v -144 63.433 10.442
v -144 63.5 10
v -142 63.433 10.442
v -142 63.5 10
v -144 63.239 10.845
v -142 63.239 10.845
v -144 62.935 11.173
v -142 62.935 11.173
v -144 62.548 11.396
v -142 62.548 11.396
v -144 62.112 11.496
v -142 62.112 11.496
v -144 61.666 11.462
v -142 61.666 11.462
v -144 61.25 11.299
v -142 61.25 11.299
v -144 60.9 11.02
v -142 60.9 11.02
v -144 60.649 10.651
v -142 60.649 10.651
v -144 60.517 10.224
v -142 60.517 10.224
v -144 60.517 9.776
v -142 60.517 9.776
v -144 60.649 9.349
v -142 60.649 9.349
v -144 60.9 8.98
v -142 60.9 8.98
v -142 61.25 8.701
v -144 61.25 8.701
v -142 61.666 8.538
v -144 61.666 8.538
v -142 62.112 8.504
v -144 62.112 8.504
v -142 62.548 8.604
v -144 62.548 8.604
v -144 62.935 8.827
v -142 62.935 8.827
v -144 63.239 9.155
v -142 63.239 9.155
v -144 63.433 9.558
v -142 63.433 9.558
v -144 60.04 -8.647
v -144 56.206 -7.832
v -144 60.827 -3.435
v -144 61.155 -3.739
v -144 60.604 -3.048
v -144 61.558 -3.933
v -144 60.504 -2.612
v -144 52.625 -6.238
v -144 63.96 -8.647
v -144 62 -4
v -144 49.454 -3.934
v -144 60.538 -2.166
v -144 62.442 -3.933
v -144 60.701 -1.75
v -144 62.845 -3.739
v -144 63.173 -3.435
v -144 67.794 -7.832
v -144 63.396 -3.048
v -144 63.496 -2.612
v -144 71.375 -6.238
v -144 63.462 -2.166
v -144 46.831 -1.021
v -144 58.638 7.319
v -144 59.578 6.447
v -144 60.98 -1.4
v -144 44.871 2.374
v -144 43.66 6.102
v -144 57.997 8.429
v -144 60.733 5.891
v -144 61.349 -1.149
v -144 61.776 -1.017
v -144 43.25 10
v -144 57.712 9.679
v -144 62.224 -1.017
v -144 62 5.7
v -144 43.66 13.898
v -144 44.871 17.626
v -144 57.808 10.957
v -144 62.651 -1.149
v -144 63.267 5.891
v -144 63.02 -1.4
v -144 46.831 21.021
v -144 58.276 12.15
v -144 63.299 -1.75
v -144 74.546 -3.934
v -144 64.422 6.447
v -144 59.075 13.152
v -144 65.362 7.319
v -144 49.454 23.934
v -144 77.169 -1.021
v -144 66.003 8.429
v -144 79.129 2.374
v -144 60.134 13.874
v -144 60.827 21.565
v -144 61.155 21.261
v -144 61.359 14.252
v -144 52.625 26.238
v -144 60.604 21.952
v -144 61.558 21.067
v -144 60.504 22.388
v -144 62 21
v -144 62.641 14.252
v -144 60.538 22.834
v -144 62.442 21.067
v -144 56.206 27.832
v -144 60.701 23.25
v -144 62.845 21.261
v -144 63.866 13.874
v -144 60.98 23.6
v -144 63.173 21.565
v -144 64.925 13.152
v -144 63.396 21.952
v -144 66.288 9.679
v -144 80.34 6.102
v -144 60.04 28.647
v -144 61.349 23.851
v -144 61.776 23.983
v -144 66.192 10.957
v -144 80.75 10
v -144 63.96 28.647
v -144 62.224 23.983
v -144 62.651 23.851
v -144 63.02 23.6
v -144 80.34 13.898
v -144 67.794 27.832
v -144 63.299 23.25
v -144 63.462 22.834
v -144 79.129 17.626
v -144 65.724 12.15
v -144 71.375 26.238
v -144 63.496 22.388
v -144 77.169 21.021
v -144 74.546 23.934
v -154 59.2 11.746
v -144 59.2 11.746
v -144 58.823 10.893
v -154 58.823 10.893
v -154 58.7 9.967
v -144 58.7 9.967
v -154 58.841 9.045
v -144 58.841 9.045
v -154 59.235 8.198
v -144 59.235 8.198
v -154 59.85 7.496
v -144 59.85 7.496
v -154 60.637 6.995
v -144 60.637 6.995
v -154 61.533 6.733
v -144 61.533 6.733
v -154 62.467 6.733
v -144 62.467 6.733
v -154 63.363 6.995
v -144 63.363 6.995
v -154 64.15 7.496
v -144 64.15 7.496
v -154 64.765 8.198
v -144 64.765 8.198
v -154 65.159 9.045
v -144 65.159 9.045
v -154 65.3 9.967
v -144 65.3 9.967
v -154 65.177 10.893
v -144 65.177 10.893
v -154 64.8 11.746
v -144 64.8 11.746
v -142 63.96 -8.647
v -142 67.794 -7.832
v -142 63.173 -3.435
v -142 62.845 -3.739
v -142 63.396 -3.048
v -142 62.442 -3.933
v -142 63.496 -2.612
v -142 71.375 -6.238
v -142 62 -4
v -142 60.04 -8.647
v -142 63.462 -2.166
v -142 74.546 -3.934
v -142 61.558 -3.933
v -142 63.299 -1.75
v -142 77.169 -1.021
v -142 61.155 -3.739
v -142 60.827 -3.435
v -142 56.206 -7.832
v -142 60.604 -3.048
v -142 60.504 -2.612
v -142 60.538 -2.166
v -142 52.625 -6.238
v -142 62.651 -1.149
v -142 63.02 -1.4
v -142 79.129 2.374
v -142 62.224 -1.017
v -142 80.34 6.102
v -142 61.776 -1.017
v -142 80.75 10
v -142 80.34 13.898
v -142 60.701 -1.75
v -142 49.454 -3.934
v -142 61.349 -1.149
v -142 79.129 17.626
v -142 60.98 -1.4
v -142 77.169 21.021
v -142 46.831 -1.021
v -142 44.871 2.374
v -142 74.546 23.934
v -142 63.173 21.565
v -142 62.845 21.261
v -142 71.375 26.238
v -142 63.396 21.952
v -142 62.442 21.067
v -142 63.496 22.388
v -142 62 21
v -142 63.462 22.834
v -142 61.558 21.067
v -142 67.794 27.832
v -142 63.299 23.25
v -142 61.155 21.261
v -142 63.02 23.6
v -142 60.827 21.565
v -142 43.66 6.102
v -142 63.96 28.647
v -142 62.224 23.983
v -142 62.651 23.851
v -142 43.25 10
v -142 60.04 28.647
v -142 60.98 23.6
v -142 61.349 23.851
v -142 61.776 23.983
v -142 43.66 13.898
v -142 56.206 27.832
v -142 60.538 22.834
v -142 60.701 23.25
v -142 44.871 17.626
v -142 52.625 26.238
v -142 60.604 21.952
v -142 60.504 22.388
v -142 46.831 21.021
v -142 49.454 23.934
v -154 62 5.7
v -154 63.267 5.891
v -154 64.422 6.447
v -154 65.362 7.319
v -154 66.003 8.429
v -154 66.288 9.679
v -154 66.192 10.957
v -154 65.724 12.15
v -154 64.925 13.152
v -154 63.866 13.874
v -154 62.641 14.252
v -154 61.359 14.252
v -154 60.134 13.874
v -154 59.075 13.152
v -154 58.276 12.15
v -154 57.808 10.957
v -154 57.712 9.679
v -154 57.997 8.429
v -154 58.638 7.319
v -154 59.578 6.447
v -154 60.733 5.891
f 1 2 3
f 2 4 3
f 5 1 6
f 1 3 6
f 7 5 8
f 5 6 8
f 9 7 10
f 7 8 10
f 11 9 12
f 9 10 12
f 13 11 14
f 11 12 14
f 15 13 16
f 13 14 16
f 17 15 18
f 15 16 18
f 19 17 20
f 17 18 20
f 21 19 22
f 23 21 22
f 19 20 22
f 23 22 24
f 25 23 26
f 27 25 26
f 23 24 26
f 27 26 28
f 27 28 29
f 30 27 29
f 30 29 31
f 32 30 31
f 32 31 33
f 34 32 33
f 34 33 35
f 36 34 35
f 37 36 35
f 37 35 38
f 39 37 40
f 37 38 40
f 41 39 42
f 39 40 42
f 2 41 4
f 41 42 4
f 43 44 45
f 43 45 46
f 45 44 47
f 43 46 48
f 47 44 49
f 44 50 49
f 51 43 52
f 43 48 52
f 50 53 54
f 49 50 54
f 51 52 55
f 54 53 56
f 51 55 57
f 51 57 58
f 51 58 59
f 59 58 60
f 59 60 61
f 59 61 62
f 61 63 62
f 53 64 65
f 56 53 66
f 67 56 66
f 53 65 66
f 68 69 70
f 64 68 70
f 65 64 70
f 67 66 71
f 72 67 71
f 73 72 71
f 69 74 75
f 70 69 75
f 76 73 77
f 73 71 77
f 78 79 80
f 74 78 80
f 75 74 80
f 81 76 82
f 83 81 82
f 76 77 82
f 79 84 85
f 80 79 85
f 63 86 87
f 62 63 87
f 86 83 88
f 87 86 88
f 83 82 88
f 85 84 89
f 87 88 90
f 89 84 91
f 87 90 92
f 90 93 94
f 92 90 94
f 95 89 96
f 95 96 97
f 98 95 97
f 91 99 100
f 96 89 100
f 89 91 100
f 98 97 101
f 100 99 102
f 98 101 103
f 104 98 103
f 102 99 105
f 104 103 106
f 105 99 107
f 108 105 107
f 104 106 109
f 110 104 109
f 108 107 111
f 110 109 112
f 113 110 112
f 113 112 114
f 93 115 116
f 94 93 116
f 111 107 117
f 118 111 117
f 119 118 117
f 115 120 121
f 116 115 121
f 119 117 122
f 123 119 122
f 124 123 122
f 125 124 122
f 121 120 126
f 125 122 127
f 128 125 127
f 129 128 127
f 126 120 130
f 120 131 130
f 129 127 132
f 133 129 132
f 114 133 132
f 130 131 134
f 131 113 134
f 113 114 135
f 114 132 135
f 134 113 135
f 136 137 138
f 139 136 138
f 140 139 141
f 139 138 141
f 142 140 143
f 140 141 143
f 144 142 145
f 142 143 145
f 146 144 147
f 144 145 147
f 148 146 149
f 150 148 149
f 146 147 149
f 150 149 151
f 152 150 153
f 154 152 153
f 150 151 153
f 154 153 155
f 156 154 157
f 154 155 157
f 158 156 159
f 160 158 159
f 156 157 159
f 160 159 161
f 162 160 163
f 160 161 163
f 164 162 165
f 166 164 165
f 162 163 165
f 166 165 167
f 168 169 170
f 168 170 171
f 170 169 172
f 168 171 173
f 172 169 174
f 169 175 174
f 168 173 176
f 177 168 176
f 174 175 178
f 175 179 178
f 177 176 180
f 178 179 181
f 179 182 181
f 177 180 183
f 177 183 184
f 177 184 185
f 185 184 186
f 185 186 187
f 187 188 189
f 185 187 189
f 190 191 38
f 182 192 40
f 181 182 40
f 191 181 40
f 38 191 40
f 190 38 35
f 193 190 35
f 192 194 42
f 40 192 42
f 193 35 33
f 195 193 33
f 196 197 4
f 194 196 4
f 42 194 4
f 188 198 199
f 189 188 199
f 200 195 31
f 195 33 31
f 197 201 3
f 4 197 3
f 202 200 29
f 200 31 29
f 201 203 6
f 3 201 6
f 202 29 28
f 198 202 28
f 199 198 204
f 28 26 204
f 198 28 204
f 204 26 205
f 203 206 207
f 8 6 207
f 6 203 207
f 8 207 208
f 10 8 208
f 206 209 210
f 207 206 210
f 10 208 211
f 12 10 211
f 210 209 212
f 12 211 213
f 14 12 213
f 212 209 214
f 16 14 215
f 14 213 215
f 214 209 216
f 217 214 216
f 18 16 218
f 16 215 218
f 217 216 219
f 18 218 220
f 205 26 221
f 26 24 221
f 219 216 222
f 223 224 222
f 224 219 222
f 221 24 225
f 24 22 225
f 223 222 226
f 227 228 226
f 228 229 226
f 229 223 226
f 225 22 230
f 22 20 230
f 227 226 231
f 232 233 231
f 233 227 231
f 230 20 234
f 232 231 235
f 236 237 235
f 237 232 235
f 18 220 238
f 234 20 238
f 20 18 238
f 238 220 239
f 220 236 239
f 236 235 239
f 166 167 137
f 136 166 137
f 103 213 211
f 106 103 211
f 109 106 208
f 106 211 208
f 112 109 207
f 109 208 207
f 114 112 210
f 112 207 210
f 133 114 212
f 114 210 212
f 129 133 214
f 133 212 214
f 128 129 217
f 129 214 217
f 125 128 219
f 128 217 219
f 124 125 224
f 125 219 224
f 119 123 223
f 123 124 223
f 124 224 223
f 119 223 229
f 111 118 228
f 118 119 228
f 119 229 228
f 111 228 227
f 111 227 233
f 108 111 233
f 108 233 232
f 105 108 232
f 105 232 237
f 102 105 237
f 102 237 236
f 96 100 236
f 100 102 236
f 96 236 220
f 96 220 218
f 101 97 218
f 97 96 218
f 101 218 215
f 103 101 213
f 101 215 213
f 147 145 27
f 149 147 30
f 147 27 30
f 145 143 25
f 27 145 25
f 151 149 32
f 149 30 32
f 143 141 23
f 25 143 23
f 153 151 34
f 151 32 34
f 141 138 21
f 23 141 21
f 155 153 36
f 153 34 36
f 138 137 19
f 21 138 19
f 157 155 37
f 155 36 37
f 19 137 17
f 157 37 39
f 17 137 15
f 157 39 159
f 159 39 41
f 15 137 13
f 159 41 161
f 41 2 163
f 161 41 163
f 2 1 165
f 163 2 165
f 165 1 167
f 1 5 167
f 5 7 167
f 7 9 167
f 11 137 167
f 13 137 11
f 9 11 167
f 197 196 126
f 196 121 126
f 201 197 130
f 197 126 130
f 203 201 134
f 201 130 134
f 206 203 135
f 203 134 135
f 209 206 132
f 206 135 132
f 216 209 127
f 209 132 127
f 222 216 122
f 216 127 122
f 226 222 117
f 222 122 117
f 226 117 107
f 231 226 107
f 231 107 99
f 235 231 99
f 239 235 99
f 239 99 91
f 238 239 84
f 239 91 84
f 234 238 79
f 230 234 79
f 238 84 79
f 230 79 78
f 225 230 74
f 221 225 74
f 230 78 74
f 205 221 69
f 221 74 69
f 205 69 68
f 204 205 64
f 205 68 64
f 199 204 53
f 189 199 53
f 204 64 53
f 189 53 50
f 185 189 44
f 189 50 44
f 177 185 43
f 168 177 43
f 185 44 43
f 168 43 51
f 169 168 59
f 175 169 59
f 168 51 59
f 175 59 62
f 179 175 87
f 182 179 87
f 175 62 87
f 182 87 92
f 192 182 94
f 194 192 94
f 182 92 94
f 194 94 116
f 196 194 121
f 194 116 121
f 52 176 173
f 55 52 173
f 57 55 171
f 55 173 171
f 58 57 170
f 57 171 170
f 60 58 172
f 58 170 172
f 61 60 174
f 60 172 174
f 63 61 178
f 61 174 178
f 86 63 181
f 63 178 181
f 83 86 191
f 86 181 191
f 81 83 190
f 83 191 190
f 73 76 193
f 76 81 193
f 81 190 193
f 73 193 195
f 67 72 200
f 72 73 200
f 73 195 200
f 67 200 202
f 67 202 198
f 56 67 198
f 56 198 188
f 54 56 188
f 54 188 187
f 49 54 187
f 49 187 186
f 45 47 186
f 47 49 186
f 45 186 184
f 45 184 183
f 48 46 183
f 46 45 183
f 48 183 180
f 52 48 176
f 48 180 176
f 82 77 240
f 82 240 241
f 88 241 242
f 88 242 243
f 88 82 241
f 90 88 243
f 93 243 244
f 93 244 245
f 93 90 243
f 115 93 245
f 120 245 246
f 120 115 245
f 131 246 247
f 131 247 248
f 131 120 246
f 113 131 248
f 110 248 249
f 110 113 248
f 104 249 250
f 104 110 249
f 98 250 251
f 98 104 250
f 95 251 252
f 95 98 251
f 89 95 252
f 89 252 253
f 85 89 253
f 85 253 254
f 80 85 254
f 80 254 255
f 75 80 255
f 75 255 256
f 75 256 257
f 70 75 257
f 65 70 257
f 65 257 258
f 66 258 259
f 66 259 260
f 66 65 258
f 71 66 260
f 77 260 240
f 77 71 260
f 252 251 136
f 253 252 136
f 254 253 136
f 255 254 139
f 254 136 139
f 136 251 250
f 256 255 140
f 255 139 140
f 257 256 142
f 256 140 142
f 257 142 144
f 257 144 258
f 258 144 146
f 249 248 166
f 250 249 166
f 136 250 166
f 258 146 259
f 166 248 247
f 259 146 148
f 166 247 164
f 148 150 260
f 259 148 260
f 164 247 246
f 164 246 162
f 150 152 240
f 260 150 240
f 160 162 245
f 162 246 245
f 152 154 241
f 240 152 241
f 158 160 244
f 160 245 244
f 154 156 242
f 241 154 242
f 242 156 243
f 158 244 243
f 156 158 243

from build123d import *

# Parameters (mm, degrees)
CYLINDER031_R           = 1.5
CYLINDER031_DEPTH       = 15
CYLINDER031_PITCH_ANGLE = 90
CYLINDER030_R           = 1.5
CYLINDER030_DEPTH       = 15
CYLINDER030_PITCH_ANGLE = 90
SKETCH016_R             = 4.3
EXTRUDE011_DEPTH        = 10
FUSION039_PITCH_ANGLE   = 90


with BuildPart() as m3_hole008:
    # Cylinder031 → Cylinder031 (new body)
    with BuildSketch(Plane.XY):
        Circle(CYLINDER031_R)
    extrude(amount=CYLINDER031_DEPTH)


with BuildPart() as m3_hole008_1:
    # Cylinder031 pitch: moved
    add(m3_hole008.part.rotate(Axis((0, 0, 0), (0, 1, 0)), CYLINDER031_PITCH_ANGLE))


with BuildPart() as m3_hole008_2:
    # Cylinder031 placement: moved
    add(m3_hole008_1.part.moved(Location((163.5, 47, -2.5))))


with BuildPart() as encoder_to_wheel_holes:
    # Cylinder030 → Cylinder030 (new body)
    with BuildSketch(Plane.XY):
        Circle(CYLINDER030_R)
    extrude(amount=CYLINDER030_DEPTH)


with BuildPart() as encoder_to_wheel_holes_1:
    # Cylinder030 pitch: moved
    add(encoder_to_wheel_holes.part.rotate(Axis((0, 0, 0), (0, 1, 0)), CYLINDER030_PITCH_ANGLE))


with BuildPart() as encoder_to_wheel_holes_2:
    # Cylinder030 placement: moved
    add(encoder_to_wheel_holes_1.part.moved(Location((163.5, 47, 22.5))))

    # Fusion096: union M3 hole008
    add(m3_hole008_2.part)


with BuildPart() as extrude011:
    # Sketch016 → Extrude011 (new body)
    with BuildSketch(Plane.XY.offset(2)):
        Circle(SKETCH016_R)
        with BuildLine():
            Line((-1.746425, 2.8), (-1.746425, -2.8))
            ThreePointArc((-1.746425, -2.8), (3.3, 0), (-1.746425, 2.8))
        make_face(mode=Mode.SUBTRACT)
    extrude(amount=EXTRUDE011_DEPTH)


with BuildPart() as encoder_to_wheel_piece:
    # Sketch015 → Revolve (revolve)
    with BuildSketch(Plane.YZ):
        Polygon((18.75, 0), (18.75, 2), (3.75, 2), (1.5, 2), (1.5, 0), (3, 0), align=None)
    revolve(axis=Axis((0, 0, 0), (0, 0, 1)))

    # Fusion039: union Extrude011
    add(extrude011.part)


with BuildPart() as encoder_to_wheel_piece_1:
    # Fusion039 pitch: moved
    add(encoder_to_wheel_piece.part.rotate(Axis((0, 0, 0), (0, 1, 0)), FUSION039_PITCH_ANGLE))


with BuildPart() as encoder_to_wheel_piece_2:
    # Fusion039 placement: moved
    add(encoder_to_wheel_piece_1.part.moved(Location((175, 47, 10))))

    # Cut055: cut Encoder-to-wheel holes
    add(encoder_to_wheel_holes_2.part, mode=Mode.SUBTRACT)


with BuildPart() as encoder_to_wheel_piece_3:
    # Cut055 placement: moved
    add(encoder_to_wheel_piece_2.part.moved(Location((-23, 15, 0))))


with BuildPart() as part_mirroring009:
    # Part__Mirroring009: instance of Encoder-to-wheel piece
    add(encoder_to_wheel_piece_3.part.mirror(Plane(origin=(5, 0, 0), x_dir=(0, -1, 0), z_dir=(1, 0, 0))))


solid = part_mirroring009.part
